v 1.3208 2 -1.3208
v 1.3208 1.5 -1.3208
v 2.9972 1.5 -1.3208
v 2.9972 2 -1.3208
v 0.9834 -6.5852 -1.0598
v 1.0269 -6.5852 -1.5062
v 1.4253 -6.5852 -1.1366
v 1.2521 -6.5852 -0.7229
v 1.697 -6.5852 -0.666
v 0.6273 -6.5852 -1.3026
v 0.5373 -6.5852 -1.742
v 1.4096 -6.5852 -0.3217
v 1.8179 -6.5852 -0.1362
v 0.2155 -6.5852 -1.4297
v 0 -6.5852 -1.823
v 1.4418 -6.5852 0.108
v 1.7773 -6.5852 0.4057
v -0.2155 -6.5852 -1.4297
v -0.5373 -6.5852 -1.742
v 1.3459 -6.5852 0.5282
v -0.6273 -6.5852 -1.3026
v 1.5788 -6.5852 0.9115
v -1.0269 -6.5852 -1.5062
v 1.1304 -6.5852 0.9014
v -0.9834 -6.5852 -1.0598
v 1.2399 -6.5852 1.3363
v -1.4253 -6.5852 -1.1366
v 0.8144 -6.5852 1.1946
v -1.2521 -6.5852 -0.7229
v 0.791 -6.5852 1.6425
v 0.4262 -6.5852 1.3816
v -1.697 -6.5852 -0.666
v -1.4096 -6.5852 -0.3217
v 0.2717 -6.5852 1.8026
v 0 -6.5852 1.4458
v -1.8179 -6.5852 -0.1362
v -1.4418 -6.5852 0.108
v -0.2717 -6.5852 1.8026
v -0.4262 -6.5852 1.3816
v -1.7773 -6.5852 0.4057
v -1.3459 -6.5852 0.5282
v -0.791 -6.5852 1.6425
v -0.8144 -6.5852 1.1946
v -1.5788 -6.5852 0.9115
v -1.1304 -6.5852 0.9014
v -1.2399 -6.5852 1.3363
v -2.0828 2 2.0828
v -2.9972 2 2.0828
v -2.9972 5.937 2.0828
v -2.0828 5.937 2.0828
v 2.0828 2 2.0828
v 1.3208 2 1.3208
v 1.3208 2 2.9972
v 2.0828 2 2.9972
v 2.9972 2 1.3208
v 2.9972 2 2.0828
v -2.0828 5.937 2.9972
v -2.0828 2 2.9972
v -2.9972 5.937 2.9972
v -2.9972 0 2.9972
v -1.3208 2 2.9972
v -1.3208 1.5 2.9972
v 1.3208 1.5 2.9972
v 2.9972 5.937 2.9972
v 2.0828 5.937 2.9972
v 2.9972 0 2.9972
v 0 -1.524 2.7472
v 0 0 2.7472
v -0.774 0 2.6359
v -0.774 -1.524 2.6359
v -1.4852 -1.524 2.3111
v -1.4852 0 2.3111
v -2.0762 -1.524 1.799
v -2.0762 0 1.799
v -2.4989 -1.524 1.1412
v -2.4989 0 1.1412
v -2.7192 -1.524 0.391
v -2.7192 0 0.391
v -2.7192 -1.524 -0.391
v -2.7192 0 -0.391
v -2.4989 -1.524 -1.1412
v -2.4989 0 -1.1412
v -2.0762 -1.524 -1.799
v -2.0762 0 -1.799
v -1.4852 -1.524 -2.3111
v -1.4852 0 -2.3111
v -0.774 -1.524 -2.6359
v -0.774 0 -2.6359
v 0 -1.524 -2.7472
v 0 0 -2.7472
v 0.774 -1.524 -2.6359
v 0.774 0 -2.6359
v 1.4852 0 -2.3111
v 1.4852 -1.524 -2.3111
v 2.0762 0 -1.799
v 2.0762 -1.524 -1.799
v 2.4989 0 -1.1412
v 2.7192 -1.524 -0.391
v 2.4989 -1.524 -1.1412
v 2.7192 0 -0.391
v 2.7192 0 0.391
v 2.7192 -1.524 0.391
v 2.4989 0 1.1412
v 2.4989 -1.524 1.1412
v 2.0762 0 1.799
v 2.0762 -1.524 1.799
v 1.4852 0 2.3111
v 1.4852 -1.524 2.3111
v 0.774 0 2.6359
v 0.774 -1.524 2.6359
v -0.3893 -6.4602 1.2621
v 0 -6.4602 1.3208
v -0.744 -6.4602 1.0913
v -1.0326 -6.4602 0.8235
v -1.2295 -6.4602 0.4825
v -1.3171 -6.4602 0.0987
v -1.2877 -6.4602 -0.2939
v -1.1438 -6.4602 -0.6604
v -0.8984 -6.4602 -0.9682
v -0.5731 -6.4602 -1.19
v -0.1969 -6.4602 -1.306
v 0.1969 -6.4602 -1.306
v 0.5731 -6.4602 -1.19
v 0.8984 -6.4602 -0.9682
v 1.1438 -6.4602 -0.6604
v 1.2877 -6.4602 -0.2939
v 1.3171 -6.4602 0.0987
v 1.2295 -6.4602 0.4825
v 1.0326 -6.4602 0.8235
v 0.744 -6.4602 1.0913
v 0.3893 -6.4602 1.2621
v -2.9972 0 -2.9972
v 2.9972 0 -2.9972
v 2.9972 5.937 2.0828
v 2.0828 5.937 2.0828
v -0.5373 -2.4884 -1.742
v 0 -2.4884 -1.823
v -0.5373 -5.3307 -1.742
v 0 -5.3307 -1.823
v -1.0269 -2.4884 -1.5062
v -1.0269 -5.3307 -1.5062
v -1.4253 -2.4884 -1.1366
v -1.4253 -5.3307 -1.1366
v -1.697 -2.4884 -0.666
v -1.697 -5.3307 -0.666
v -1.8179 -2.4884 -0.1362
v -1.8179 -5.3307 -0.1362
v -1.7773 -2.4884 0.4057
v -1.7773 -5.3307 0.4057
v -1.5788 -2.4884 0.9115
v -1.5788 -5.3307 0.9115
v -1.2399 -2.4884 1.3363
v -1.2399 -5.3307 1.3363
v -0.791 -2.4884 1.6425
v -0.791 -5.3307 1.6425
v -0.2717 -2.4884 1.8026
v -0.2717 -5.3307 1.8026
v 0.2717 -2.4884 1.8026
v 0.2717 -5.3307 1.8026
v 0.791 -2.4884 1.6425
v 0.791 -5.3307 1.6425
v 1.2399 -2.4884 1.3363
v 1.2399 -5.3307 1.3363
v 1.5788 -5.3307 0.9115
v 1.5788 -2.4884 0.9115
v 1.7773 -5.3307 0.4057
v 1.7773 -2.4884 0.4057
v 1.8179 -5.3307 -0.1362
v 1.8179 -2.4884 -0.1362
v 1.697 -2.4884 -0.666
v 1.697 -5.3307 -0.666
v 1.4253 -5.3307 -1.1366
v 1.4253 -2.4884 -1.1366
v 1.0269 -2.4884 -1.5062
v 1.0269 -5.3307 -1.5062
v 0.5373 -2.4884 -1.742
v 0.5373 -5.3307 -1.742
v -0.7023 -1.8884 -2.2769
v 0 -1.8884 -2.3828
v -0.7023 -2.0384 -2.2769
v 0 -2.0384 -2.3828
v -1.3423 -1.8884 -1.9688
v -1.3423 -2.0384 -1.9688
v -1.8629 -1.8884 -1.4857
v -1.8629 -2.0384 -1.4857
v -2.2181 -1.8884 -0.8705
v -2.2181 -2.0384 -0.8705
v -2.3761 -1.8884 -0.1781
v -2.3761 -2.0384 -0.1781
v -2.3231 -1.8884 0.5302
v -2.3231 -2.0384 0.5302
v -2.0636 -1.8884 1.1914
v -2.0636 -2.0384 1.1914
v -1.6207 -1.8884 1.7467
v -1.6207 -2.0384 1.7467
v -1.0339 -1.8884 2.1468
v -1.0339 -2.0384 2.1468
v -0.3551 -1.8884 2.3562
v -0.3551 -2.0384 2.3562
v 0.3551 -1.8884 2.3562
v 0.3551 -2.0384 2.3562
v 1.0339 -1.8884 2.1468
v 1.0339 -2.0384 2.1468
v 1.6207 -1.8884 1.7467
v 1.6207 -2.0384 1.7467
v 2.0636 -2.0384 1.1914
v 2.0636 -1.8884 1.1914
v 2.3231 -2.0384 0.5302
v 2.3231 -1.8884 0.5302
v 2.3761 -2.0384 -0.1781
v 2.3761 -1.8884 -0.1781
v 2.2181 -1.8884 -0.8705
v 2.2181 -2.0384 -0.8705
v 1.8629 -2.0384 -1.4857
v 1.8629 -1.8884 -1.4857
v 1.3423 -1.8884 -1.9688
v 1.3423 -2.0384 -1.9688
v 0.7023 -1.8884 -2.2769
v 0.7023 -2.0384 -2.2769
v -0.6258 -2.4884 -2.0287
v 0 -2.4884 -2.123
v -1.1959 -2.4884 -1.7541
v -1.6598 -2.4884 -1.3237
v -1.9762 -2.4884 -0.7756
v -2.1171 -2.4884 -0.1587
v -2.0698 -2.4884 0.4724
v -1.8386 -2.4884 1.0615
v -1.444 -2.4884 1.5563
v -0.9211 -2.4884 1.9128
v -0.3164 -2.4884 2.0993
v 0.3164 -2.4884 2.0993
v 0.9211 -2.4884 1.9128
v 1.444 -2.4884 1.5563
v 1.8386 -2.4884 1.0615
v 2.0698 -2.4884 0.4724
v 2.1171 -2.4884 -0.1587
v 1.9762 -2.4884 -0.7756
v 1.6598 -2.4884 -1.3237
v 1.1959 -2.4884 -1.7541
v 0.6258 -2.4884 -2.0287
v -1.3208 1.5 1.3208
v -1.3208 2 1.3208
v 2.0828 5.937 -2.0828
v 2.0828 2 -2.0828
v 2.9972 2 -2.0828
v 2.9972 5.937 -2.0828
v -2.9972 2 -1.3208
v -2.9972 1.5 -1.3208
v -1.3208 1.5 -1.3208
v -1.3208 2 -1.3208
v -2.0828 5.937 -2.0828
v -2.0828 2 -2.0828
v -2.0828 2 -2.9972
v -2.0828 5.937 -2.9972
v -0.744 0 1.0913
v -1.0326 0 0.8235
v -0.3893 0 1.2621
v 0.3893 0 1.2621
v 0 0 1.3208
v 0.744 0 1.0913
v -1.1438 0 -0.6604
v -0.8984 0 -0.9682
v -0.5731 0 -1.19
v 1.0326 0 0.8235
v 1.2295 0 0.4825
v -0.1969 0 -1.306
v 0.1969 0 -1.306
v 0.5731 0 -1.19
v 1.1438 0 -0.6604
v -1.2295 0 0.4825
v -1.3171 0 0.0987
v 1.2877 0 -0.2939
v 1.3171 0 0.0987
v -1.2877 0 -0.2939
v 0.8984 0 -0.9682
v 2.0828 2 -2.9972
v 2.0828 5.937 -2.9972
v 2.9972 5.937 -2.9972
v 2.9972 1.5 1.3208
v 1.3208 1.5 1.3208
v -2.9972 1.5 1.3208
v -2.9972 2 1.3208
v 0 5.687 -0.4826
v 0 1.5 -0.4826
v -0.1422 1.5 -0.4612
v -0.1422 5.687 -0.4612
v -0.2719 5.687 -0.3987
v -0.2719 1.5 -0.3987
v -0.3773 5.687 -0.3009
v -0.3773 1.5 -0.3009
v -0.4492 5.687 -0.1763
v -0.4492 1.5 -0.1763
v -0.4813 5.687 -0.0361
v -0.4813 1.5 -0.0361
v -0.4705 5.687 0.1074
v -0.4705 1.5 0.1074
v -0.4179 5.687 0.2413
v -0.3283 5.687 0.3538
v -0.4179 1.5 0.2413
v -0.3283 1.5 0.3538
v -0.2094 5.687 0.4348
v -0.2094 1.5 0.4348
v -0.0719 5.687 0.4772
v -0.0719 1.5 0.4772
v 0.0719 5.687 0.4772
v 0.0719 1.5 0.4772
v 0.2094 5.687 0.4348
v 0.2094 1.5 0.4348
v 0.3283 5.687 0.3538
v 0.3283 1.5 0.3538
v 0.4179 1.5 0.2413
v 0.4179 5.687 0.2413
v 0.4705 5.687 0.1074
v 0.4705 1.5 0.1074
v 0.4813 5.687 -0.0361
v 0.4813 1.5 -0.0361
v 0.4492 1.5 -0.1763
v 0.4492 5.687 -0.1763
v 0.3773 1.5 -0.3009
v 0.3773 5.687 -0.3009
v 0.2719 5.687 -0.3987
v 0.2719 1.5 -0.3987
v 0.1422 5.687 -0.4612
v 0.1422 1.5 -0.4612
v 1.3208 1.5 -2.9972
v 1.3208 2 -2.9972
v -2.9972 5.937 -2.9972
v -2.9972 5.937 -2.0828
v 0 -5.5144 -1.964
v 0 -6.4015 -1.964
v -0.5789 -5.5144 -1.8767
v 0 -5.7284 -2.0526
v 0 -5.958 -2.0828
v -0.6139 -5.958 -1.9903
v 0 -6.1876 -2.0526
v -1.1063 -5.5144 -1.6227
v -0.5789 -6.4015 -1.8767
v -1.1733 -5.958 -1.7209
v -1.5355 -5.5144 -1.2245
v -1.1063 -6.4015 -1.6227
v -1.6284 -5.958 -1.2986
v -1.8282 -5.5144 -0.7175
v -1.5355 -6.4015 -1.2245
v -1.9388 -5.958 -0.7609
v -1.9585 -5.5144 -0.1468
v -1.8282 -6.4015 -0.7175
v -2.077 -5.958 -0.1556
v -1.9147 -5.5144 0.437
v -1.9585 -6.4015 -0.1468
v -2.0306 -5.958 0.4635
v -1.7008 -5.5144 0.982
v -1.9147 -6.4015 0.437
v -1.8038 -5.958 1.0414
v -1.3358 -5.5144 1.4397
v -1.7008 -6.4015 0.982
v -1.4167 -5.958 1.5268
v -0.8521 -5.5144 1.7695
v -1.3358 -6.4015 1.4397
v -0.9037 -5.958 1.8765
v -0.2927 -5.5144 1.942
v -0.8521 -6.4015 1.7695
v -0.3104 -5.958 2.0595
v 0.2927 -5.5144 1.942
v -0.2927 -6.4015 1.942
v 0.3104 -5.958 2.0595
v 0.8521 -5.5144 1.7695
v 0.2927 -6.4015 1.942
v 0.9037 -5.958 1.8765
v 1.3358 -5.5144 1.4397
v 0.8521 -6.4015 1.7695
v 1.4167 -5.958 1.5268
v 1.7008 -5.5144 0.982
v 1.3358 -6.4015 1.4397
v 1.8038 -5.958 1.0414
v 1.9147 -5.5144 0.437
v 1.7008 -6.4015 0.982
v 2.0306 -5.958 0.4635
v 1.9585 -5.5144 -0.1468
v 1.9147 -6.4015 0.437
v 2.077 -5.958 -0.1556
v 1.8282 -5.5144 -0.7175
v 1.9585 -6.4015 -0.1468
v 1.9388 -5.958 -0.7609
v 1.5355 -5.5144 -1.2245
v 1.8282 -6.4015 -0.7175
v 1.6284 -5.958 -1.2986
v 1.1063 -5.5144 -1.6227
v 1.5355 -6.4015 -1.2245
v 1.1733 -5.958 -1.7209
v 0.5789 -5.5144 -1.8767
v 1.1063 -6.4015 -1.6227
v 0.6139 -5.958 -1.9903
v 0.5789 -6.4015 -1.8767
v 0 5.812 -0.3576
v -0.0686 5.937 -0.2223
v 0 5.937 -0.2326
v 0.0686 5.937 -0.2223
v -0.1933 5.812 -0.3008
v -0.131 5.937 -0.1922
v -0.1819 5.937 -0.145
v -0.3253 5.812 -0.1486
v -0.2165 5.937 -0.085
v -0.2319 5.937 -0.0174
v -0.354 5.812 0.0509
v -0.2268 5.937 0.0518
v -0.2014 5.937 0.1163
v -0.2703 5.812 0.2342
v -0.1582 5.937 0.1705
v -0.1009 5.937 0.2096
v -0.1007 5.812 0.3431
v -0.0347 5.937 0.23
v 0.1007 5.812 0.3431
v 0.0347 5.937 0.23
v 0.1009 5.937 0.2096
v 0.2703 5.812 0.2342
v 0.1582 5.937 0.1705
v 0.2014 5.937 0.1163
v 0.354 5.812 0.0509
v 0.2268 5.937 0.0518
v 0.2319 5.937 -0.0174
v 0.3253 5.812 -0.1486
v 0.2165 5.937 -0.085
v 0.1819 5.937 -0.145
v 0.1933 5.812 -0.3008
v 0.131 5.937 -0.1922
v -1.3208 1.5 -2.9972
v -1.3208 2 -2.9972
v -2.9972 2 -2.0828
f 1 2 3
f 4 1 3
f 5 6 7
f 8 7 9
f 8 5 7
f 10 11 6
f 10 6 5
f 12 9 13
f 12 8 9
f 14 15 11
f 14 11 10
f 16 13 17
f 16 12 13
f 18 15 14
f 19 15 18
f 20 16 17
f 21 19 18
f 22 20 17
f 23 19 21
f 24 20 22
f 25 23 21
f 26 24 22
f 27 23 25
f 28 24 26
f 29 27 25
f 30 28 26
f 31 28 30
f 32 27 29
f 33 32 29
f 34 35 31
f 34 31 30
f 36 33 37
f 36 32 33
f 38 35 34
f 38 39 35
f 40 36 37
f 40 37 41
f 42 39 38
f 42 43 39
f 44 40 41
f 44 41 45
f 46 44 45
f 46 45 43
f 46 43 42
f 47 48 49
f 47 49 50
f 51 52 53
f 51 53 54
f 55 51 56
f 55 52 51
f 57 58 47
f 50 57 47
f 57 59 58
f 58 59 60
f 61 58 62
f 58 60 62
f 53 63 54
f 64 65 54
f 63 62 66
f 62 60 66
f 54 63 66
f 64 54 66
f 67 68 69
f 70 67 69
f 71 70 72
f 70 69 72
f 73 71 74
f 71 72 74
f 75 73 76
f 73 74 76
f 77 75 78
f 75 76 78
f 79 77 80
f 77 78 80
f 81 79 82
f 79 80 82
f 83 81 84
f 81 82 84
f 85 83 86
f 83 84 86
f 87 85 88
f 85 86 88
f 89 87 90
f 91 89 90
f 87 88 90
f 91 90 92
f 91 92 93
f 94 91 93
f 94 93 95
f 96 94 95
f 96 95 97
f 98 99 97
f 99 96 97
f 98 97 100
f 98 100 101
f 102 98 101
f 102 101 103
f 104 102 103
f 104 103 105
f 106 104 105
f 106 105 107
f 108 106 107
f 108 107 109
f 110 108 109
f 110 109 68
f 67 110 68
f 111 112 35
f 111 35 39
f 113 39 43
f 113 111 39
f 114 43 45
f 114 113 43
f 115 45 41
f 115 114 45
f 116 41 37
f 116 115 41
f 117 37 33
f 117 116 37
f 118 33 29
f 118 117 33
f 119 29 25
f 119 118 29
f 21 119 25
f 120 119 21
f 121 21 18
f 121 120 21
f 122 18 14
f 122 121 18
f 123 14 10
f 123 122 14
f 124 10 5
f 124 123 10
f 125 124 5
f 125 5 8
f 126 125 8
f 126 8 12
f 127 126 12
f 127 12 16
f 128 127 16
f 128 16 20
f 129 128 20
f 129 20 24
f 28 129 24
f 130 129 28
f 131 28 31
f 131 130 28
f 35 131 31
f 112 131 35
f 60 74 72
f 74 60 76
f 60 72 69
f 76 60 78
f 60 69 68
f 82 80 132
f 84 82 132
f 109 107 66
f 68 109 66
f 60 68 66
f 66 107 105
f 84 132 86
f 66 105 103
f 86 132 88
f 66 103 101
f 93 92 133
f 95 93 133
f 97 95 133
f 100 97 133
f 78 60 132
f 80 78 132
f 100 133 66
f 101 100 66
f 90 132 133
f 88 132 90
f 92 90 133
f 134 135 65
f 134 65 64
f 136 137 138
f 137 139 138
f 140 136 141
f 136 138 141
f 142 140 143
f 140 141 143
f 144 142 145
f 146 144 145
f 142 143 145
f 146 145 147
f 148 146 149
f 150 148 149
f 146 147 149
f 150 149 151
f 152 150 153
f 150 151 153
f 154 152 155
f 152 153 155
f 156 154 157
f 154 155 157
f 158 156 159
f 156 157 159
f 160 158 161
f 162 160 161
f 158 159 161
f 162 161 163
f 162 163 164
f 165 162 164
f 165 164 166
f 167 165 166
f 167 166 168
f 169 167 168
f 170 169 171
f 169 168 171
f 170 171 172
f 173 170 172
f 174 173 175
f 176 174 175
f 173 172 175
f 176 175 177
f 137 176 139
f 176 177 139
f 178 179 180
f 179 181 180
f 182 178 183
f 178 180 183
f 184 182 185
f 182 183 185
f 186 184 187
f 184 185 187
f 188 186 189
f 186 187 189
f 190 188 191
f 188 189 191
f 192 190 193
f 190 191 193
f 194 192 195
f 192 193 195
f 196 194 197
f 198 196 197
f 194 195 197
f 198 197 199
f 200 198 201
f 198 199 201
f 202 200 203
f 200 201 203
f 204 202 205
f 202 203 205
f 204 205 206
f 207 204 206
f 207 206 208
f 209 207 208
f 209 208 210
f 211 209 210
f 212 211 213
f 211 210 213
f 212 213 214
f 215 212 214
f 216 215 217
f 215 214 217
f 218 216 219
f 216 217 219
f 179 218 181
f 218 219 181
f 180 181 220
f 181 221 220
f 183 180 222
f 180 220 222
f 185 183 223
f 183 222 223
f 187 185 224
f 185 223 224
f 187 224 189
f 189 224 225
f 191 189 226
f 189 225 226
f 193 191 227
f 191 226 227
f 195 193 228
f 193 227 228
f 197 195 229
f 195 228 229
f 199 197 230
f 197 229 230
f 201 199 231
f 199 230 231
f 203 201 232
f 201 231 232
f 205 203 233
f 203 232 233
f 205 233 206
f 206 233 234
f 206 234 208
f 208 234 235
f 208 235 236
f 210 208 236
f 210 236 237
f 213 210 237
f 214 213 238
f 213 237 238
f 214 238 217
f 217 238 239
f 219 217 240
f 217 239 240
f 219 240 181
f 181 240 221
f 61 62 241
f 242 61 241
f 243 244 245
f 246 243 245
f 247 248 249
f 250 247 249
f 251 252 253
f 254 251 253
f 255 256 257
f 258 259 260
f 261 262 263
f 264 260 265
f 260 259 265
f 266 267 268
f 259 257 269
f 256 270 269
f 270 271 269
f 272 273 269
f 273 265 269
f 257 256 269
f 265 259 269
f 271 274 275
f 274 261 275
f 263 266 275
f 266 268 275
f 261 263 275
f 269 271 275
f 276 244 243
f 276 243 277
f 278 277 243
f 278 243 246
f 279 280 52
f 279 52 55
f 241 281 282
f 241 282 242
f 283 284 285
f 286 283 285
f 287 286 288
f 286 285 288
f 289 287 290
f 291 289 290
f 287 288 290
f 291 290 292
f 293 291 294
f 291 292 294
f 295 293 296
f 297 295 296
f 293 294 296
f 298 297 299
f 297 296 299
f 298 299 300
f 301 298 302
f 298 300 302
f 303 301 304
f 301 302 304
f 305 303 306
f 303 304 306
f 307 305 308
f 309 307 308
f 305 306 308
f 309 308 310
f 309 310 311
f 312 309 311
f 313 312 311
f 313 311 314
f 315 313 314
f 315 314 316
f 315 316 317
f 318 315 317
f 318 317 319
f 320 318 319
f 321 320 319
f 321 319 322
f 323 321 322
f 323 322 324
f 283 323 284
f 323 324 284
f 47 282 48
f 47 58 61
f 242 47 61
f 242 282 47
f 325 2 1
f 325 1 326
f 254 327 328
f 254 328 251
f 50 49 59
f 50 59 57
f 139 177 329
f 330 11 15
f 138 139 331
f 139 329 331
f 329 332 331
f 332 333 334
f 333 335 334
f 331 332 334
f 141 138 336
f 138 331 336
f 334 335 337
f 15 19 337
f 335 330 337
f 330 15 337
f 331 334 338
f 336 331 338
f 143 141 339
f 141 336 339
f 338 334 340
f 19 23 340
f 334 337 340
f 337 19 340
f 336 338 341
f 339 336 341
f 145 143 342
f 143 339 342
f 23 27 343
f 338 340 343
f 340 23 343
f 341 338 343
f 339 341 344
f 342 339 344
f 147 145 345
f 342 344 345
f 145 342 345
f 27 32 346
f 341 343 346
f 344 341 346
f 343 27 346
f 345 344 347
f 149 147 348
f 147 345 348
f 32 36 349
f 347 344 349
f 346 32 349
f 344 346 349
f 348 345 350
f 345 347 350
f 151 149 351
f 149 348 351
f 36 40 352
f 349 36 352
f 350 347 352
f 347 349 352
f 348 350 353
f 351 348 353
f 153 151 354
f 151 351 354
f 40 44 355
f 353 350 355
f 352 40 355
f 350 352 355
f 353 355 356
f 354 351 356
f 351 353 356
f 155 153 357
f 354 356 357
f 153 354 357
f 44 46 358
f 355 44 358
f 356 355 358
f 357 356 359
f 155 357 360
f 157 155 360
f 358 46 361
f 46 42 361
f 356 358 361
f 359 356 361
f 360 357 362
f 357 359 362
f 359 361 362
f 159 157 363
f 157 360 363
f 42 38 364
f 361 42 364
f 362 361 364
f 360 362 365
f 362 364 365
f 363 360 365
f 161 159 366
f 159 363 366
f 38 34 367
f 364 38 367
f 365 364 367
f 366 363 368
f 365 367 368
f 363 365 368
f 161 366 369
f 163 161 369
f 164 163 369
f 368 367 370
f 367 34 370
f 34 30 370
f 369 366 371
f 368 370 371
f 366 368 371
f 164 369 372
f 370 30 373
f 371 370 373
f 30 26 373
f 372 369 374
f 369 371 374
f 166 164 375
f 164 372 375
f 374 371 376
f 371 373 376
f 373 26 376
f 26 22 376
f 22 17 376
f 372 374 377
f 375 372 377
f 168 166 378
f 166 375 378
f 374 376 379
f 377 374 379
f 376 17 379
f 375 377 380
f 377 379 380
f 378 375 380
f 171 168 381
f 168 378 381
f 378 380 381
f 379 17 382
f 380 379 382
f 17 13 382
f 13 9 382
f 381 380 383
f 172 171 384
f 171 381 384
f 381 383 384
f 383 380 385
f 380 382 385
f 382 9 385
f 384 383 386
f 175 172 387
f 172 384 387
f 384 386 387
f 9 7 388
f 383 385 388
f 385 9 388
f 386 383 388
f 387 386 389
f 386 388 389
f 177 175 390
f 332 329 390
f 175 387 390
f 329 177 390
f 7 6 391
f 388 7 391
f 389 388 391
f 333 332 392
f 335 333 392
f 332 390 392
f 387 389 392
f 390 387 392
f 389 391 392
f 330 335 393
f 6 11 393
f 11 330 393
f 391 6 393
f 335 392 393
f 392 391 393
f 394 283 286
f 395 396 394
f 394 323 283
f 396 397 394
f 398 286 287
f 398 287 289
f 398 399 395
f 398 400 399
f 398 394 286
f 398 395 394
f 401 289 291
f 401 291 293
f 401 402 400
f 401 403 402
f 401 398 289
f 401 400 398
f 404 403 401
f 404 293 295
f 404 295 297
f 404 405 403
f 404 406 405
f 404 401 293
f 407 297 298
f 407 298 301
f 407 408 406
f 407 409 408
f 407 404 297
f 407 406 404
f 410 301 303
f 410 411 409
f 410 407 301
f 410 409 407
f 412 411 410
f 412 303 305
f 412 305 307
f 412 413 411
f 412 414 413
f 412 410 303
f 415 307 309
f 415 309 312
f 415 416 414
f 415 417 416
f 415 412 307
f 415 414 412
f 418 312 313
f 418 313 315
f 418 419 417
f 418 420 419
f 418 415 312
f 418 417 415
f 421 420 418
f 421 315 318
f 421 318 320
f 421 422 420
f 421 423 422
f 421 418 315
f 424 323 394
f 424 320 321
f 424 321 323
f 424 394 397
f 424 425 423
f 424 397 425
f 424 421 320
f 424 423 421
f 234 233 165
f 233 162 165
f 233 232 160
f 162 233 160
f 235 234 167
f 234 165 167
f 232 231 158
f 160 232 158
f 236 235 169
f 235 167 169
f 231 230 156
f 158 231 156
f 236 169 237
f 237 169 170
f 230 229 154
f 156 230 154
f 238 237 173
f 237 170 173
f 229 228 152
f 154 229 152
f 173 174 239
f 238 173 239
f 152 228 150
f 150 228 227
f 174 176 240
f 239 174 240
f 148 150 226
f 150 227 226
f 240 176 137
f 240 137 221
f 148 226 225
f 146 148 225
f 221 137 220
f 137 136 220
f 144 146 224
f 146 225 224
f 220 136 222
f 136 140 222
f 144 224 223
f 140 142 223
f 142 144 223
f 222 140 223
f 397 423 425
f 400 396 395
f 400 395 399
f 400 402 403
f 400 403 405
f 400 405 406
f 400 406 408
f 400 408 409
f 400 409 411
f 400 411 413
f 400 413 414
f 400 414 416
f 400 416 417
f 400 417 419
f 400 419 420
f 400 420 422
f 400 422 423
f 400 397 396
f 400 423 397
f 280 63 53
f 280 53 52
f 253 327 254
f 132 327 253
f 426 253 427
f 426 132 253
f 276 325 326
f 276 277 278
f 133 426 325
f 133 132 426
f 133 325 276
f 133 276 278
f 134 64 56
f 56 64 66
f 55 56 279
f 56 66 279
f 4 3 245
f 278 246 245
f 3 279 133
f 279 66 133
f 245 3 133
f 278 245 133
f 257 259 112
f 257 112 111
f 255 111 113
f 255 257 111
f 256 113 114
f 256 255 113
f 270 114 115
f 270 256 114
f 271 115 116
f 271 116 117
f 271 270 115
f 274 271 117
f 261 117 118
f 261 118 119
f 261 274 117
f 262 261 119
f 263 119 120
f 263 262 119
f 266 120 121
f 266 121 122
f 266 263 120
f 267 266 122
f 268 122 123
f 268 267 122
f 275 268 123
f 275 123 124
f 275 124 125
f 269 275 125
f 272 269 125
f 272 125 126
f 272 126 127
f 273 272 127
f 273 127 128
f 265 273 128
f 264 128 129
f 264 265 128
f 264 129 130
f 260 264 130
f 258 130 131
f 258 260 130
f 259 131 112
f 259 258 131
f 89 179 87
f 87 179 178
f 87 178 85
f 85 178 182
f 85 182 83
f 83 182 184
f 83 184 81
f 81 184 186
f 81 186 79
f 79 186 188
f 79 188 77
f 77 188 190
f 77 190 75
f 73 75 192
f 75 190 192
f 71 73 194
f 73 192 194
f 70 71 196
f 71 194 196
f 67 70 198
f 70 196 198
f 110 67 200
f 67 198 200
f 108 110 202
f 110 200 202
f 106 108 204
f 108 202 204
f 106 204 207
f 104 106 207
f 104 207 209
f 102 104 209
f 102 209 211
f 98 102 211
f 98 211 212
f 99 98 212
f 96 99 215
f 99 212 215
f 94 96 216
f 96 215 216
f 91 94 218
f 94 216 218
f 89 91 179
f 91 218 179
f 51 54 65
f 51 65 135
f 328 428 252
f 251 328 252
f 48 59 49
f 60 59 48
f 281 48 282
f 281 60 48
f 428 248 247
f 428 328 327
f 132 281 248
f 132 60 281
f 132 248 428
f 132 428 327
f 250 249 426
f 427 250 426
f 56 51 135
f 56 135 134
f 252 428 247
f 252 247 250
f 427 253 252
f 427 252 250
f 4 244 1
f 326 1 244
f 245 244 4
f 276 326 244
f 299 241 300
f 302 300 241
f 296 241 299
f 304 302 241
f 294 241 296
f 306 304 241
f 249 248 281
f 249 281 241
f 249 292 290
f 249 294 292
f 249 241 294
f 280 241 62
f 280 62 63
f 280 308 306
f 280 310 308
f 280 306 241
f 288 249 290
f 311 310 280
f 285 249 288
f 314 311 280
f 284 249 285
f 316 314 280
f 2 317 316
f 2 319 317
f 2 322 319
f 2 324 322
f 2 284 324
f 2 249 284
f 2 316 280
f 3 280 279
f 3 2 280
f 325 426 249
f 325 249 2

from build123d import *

# Parameters (mm, degrees)
SKETCH1_W           = 5.9944
SKETCH1_H           = 5.9944
BOSS_EXTRUDE1_DEPTH = 1.5
SKETCH2_W           = 1.6764
SKETCH2_H           = 1.6764
BOSS_EXTRUDE2_DEPTH = 0.5
SKETCH3_W           = 0.9144
SKETCH3_H           = 0.9144
BOSS_EXTRUDE3_DEPTH = 3.937
SKETCH4_R           = 2.7472
SKETCH4_R_2         = 1.3208
BOSS_EXTRUDE4_DEPTH = 6.5852
CHAMFER1_SIZE       = 0.125
SKETCH7_R           = 0.4826
BOSS_EXTRUDE5_DEPTH = 4.437
CHAMFER2_SIZE       = 0.25


with BuildPart() as part:
    # Sketch1 → Boss-Extrude1 (new body)
    with BuildSketch(Plane(origin=(0, 0, 0), x_dir=(1, 0, 0), z_dir=(0, 1, 0))):
        Rectangle(SKETCH1_W, SKETCH1_H)
    extrude(amount=BOSS_EXTRUDE1_DEPTH)

    # Sketch2 → Boss-Extrude2 (add)
    with BuildSketch(Plane(origin=(0, 1.5, 0), x_dir=(1, 0, 0), z_dir=(0, 1, 0))):
        with Locations((-2.159, 2.159)):
            Rectangle(SKETCH2_W, SKETCH2_H)
        with Locations((2.159, 2.159)):
            Rectangle(SKETCH2_W, SKETCH2_H)
        with Locations((2.159, -2.159)):
            Rectangle(SKETCH2_W, SKETCH2_H)
        with Locations((-2.159, -2.159)):
            Rectangle(SKETCH2_W, SKETCH2_H)
    extrude(amount=BOSS_EXTRUDE2_DEPTH)

    # Sketch3 → Boss-Extrude3 (add)
    with BuildSketch(Plane(origin=(0, 2, 0), x_dir=(1, 0, 0), z_dir=(0, 1, 0))):
        with Locations((-2.54, -2.54)):
            Rectangle(SKETCH3_W, SKETCH3_H)
        with Locations((2.54, -2.54)):
            Rectangle(SKETCH3_W, SKETCH3_H)
        with Locations((2.54, 2.54)):
            Rectangle(SKETCH3_W, SKETCH3_H)
        with Locations((-2.54, 2.54)):
            Rectangle(SKETCH3_W, SKETCH3_H)
    extrude(amount=BOSS_EXTRUDE3_DEPTH)

    # Sketch4 → Boss-Extrude4 (add)
    with BuildSketch(Plane.XZ):
        with Locations(Location((0, 0, 0), (0, 0, 90))):
            Circle(SKETCH4_R)
        with Locations(Location((0, 0, 0), (0, 0, 90))):
            Circle(SKETCH4_R_2, mode=Mode.SUBTRACT)
    extrude(amount=BOSS_EXTRUDE4_DEPTH)

    # Chamfer1
    chamfer1_edges = [part.edges().sort_by_distance(p)[0] for p in [
        (0, -6.5852, -1.3208),
        (0, -6.5852, -2.7472),
    ]]
    chamfer(chamfer1_edges, length=CHAMFER1_SIZE)

    # Sketch5 → Cut-Revolve1 (revolve, cut)
    with BuildSketch(Plane.XY, mode=Mode.PRIVATE) as cut_revolve1_sk:
        with BuildLine():
            Line((-2.7472, 0), (-2.7472, -1.524))
            Line((-2.7472, -1.524), (-2.3828, -1.8884))
            Line((-2.3828, -1.8884), (-2.3828, -2.0384))
            Line((-2.3828, -2.0384), (-2.122992379, -2.4884))
            Line((-2.122992379, -2.4884), (-1.822992379, -2.4884))
            Line((-1.822992379, -2.4884), (-1.822992379, -5.330737835))
            ThreePointArc((-1.822992379, -5.330737835), (-2.0828, -5.957968917), (-1.822992379, -6.5852))
            Line((-1.822992379, -6.5852), (-3.193096247, -6.5852))
            Line((-3.193096247, -6.5852), (-3.193096247, 0))
            Line((-3.193096247, 0), (-2.7472, 0))
        make_face()
    revolve(cut_revolve1_sk.sketch.rotate(Axis((0, -6.4602, 0), (0, 1, 0)), 270), axis=Axis((0, -6.4602, 0), (0, 1, 0)), mode=Mode.SUBTRACT)

    # Sketch7 → Boss-Extrude5 (add)
    with BuildSketch(Plane(origin=(0, 1.5, 0), x_dir=(1, 0, 0), z_dir=(0, 1, 0))):
        with Locations(Location((0, 0, 0), (0, 0, 90))):
            Circle(SKETCH7_R)
    extrude(amount=BOSS_EXTRUDE5_DEPTH)

    # Chamfer2
    chamfer2_edges = [part.edges().sort_by_distance(p)[0] for p in [
        (0, 5.937, 0.4826),
    ]]
    chamfer(chamfer2_edges, length=CHAMFER2_SIZE)


solid = part.part
